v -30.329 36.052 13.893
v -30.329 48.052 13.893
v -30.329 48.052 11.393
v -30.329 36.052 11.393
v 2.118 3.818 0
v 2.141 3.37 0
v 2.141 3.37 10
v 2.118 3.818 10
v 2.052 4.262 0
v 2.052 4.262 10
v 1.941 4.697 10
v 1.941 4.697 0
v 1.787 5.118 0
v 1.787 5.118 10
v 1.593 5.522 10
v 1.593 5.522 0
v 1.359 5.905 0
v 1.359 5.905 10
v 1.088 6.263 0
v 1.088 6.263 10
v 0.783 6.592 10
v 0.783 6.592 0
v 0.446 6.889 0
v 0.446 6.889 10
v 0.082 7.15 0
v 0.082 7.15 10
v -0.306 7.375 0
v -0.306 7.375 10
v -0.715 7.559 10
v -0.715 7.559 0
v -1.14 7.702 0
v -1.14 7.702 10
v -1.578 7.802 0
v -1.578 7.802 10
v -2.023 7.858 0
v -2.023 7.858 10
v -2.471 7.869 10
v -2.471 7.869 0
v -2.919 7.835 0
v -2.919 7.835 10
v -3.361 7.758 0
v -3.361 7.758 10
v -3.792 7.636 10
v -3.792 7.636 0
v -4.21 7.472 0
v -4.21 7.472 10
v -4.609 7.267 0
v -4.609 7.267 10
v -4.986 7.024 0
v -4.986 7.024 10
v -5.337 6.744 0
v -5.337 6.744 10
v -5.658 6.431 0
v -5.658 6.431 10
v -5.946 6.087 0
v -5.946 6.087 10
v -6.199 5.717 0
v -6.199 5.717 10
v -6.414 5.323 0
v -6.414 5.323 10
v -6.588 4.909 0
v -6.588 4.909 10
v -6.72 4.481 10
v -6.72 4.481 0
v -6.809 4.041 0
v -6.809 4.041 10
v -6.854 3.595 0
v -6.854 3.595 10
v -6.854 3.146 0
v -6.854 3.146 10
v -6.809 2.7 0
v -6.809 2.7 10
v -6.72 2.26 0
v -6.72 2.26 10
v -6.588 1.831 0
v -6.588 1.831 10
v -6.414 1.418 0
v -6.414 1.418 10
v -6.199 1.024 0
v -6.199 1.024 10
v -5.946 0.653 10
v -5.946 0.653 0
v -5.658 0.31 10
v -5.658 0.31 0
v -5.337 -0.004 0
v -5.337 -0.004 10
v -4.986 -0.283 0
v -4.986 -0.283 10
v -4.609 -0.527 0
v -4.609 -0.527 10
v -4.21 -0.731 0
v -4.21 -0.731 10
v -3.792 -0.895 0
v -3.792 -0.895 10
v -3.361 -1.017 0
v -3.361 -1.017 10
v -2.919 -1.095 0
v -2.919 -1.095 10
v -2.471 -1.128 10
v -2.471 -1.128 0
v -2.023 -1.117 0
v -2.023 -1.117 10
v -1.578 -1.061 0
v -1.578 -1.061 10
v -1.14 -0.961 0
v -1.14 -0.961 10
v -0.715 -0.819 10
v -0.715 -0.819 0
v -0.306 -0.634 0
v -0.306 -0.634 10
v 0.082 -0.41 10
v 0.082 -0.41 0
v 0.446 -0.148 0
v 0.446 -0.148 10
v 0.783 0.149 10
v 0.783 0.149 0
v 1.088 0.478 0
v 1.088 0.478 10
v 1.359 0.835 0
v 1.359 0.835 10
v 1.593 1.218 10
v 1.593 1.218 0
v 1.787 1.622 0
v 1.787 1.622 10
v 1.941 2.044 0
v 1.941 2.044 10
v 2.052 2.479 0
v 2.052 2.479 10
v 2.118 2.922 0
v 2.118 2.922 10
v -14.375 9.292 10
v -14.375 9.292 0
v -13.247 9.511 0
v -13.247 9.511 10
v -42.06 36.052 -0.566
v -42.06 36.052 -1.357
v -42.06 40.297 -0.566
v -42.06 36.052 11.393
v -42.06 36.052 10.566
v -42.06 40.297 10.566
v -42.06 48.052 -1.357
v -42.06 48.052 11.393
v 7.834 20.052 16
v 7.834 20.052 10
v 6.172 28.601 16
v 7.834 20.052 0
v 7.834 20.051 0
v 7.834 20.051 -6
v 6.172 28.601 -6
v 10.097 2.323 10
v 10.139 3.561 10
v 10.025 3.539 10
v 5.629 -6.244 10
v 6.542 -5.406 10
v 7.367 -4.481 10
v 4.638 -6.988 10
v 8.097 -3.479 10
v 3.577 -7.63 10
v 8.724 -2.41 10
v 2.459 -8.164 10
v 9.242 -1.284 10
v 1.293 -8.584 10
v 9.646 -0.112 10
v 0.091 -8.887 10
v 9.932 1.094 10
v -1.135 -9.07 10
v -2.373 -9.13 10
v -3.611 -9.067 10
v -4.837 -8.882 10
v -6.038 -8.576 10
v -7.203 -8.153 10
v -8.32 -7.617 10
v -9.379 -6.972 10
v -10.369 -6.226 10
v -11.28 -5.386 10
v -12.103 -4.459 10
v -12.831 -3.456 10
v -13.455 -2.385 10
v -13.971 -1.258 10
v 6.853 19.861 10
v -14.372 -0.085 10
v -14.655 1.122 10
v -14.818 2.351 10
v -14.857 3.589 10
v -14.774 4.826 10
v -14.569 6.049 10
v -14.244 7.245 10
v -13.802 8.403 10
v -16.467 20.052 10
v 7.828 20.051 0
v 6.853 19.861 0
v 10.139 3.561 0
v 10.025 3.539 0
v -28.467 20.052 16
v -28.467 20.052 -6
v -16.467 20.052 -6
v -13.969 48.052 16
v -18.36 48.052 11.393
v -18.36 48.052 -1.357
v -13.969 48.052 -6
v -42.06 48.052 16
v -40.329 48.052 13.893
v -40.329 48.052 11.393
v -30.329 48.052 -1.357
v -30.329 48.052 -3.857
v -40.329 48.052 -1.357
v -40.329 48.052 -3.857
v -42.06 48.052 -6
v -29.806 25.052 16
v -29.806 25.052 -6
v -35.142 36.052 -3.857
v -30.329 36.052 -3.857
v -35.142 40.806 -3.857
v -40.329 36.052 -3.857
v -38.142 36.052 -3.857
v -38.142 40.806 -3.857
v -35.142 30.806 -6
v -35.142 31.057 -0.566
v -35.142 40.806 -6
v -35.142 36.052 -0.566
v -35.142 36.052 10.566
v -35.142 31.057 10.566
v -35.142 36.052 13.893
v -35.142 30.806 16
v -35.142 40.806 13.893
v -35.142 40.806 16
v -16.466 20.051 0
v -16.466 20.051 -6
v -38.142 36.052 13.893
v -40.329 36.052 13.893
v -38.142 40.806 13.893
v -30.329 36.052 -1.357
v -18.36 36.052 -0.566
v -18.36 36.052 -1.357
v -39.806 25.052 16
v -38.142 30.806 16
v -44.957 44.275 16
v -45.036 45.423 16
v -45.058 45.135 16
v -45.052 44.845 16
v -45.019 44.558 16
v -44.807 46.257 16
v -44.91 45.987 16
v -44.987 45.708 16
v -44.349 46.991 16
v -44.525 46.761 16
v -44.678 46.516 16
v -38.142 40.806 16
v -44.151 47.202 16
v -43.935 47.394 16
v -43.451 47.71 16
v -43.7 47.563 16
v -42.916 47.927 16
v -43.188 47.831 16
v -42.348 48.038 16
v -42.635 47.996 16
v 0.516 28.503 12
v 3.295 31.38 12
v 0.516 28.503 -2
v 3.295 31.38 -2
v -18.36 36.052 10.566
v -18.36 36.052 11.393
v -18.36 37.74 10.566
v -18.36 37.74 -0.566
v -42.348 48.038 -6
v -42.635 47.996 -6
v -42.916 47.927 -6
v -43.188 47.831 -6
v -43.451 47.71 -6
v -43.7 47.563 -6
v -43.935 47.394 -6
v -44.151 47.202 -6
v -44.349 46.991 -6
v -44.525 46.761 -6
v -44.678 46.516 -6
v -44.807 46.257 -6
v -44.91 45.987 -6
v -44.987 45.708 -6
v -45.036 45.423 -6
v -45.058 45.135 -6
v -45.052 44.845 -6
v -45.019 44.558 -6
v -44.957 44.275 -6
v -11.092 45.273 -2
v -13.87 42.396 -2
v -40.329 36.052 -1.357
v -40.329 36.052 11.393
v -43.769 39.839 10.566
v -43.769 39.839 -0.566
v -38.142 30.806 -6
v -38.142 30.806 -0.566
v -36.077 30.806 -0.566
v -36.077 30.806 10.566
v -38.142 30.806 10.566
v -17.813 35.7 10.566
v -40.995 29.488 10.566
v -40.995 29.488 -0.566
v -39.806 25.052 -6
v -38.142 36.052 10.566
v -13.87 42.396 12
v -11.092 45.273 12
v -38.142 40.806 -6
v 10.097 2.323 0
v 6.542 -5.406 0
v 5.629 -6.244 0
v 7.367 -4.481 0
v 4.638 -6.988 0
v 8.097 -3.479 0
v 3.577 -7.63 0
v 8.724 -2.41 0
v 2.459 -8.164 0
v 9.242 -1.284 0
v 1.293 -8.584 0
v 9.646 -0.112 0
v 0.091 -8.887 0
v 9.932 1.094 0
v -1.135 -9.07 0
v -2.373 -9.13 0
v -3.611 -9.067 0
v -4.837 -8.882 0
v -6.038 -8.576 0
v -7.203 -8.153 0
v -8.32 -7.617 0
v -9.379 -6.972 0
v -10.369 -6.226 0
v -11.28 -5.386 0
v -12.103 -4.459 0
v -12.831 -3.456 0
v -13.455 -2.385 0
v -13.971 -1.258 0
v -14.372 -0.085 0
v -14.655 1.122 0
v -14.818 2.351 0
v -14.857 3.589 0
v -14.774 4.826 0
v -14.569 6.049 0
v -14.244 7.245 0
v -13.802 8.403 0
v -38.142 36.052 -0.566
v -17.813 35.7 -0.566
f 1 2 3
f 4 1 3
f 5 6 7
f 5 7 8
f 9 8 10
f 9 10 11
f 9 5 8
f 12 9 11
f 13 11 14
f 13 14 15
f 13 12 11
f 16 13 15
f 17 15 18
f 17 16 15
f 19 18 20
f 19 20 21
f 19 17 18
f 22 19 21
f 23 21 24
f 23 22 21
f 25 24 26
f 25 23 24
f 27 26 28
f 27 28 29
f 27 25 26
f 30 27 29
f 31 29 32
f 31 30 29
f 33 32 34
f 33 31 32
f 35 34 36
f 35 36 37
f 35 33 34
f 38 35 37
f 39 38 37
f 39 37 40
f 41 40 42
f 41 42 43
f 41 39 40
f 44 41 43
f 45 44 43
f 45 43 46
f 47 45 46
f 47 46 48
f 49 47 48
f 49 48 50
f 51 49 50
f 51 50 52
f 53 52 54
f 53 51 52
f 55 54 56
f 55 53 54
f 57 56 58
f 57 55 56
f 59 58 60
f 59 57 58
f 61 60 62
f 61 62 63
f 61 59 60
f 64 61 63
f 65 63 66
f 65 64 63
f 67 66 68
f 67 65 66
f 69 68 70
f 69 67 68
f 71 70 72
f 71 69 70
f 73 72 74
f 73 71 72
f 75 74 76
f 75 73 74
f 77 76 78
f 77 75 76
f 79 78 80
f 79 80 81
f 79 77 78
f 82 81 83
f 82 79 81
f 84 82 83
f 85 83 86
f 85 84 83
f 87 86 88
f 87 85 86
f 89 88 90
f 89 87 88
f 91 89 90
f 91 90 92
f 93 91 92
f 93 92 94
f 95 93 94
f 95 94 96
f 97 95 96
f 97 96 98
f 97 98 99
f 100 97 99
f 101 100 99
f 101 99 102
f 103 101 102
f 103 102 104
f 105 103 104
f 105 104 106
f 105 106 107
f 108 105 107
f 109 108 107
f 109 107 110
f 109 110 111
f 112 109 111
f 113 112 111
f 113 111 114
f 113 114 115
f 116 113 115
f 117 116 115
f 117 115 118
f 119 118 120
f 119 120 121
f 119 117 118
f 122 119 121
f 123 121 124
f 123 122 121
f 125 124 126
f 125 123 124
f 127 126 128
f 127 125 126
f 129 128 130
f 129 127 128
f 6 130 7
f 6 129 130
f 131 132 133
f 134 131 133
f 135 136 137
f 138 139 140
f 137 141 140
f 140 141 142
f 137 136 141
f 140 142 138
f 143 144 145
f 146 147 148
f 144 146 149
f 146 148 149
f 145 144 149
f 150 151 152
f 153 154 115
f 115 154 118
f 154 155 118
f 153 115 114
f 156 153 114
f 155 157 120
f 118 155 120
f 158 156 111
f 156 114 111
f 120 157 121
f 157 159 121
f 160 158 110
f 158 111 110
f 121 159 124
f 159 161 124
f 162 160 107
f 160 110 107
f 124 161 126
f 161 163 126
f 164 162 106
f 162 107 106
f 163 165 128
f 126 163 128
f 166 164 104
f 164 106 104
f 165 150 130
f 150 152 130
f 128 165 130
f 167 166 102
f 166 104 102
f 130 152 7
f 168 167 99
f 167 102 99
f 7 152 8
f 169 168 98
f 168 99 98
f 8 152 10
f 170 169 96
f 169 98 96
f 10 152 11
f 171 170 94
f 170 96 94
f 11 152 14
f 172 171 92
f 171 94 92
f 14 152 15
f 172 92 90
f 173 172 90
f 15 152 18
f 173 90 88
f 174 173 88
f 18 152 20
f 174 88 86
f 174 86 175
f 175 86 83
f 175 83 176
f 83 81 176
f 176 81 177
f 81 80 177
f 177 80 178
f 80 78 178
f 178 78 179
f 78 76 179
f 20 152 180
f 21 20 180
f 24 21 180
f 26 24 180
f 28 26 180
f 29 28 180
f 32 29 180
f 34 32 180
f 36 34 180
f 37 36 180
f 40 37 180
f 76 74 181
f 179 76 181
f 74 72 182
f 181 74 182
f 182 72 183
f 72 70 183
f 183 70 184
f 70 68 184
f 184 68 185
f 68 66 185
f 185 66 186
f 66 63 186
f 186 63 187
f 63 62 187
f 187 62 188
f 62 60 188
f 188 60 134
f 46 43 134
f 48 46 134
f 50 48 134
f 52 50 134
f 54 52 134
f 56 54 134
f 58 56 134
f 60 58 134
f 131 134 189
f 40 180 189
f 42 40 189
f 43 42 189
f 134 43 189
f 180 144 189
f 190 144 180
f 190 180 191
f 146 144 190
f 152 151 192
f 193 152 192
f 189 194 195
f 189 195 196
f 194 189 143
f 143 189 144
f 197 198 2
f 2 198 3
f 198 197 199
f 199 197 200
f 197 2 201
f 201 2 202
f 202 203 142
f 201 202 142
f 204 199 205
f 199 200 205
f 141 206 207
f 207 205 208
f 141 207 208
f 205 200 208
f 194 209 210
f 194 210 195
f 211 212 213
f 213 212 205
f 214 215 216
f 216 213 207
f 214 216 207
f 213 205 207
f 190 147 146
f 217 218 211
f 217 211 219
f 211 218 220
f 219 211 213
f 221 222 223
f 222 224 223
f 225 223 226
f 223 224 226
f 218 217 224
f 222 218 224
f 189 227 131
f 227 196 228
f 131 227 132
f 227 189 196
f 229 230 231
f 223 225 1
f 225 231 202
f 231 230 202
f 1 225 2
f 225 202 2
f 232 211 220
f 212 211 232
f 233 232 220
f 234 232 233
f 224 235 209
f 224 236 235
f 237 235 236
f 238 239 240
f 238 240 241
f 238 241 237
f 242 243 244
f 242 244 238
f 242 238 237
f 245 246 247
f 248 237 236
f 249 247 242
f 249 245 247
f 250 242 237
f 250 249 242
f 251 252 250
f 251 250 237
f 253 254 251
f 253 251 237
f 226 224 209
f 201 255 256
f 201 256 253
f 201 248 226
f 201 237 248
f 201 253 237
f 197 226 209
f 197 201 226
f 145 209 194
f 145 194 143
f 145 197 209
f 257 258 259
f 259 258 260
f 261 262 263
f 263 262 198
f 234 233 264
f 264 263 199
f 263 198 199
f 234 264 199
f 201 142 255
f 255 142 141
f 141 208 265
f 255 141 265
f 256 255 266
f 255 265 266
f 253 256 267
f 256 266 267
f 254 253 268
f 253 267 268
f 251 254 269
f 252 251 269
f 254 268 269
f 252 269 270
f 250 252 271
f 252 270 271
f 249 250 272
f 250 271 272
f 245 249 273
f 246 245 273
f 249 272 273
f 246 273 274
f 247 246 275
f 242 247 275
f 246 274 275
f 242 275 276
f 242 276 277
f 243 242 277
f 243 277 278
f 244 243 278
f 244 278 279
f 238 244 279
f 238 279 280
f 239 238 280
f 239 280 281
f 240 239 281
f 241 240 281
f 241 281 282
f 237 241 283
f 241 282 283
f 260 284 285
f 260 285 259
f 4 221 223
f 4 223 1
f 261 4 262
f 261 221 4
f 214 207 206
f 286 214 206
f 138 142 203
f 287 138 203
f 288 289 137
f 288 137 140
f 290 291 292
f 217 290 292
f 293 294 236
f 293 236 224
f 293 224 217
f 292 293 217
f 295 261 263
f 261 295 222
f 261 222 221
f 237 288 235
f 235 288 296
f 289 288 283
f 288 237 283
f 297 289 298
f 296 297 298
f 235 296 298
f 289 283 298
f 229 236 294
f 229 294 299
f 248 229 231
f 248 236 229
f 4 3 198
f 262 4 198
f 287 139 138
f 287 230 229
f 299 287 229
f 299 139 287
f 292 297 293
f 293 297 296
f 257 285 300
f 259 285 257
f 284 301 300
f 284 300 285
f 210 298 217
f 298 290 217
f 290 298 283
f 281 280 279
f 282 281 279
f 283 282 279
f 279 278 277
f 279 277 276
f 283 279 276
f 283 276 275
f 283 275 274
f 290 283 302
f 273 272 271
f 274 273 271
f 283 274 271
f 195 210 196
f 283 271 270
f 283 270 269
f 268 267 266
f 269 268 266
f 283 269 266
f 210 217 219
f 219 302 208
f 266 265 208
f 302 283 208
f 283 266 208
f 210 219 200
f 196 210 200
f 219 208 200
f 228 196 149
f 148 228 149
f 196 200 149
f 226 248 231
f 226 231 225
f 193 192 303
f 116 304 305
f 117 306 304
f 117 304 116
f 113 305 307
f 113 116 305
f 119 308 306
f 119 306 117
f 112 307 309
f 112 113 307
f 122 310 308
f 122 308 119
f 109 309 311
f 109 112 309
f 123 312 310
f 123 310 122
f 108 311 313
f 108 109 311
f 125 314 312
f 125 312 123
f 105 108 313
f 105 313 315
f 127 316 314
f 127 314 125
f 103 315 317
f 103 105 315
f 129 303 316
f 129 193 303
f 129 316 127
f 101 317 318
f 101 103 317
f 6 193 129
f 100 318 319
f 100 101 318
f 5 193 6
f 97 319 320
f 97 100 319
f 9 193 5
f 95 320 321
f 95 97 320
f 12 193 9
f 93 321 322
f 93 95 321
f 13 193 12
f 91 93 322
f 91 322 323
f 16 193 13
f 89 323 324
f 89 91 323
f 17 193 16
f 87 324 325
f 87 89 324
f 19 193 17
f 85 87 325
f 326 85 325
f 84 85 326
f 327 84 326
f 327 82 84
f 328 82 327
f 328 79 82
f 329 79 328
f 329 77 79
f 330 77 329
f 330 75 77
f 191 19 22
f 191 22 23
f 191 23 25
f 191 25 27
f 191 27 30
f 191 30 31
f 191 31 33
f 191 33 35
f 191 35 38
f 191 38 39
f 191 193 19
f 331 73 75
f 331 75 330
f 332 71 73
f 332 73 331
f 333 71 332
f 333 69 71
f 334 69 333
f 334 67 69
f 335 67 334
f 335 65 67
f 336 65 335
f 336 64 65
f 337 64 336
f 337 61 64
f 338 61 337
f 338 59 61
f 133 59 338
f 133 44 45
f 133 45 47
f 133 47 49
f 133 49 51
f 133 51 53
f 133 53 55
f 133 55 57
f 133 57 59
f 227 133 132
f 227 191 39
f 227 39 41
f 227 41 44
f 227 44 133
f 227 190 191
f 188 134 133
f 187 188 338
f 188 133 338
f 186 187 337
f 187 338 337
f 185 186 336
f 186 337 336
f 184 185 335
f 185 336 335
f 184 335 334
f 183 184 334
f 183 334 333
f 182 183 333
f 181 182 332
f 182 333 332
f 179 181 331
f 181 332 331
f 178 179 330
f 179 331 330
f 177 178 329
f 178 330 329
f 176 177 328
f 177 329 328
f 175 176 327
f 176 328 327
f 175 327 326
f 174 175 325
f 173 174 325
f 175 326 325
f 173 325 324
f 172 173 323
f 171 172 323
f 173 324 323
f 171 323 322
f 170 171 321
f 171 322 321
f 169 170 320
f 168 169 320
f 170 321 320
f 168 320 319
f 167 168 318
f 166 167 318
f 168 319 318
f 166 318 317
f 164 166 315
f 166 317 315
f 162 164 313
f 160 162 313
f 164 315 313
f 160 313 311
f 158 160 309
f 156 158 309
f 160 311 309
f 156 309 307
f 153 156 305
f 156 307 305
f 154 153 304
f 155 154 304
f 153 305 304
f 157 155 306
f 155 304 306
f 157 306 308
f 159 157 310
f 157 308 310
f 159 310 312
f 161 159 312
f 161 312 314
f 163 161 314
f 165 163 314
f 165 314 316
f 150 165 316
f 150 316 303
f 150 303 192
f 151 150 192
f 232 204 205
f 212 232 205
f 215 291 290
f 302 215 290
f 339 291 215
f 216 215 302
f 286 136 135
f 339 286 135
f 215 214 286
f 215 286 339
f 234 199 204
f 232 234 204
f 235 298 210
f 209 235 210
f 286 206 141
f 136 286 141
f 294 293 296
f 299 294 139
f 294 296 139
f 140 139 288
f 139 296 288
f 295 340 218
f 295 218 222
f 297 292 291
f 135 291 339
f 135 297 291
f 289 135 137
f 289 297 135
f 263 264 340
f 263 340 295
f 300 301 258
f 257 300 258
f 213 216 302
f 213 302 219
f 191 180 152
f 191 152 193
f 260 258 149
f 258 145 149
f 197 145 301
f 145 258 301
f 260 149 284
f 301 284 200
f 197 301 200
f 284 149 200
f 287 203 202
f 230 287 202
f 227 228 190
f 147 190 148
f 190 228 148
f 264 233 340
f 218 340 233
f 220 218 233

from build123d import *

# Parameters (mm, degrees)
SKETCH1_R                = 12.499992756
SKETCH1_R_2              = 4.5
BOSS_EXTRUDE1_DEPTH      = 10
BOSS_EXTRUDE2_DEPTH      = 11
BOSS_EXTRUDE2_DEPTH_BACK = 11
SKETCH7_W                = 11.132946344
SKETCH7_H                = 10.716090789
CUT_EXTRUDE1_DEPTH       = 24
CUT_EXTRUDE2_DEPTH       = 12
SKETCH9_W                = 20
SKETCH9_H                = 14
CUT_EXTRUDE3_DEPTH       = 4
SKETCH11_W               = 3
SKETCH11_H               = 10
CUT_EXTRUDE6_DEPTH       = 29
CUT_EXTRUDE7_DEPTH       = 6
CUT_EXTRUDE8_DEPTH       = 6
SKETCH14_W               = 10
SKETCH14_H               = 16.627390186
CUT_EXTRUDE11_DEPTH      = 1


with BuildPart() as part:
    # Sketch1 → Boss-Extrude1 (new body)
    with BuildSketch(Plane.XY):
        with Locations((-2.359227986, 3.370325694)):
            Circle(SKETCH1_R)
        with Locations((-2.359227986, 3.370325694)):
            Circle(SKETCH1_R_2, mode=Mode.SUBTRACT)
    extrude(amount=BOSS_EXTRUDE1_DEPTH)

    # Sketch2 → Boss-Extrude2 (add, two sides: drawn at the far end of the back side and taken through both)
    with BuildSketch(Plane.XY.offset(5).offset(-BOSS_EXTRUDE2_DEPTH_BACK)):
        with BuildLine():
            Line((-16.466638632, 20.051877412), (-14.375085898, 9.29175702))
            Line((-14.375085898, 9.29175702), (-13.02590258, 9.55401134))
            ThreePointArc((-13.02590258, 9.55401134), (-0.090713324, 14.688621829), (10.07529252, 5.184113893))
            Line((10.07529252, 5.184113893), (10.656286173, 5.533200654))
            Line((10.656286173, 5.533200654), (6.172277384, 28.601437959))
            Line((6.172277384, 28.601437959), (-13.969202109, 48.051877412))
            Line((-13.969202109, 48.051877412), (-42.05953414, 48.051877412))
            ThreePointArc((-42.05953414, 48.051877412), (-44.439585044, 46.878168187), (-44.957305605, 44.275438644))
            Line((-44.957305605, 44.275438644), (-39.806421347, 25.051869783))
            Line((-39.806421347, 25.051869783), (-29.806421347, 25.051869783))
            Line((-29.806421347, 25.051869783), (-28.466638632, 20.051877412))
            Line((-28.466638632, 20.051877412), (-16.466638632, 20.051877412))
        make_face()
    extrude(amount=BOSS_EXTRUDE2_DEPTH + BOSS_EXTRUDE2_DEPTH_BACK)

    # Sketch7 → Cut-Extrude1 (cut)
    with BuildSketch(Plane(origin=(-30.87704133, -8.273389154, 0), x_dir=(0, 0, 1), z_dir=(-0.9659265233912161, -0.2588164434678725, 0))):
        with Locations((5, 44.451666175)):
            Rectangle(SKETCH7_W, SKETCH7_H)
    extrude(amount=-CUT_EXTRUDE1_DEPTH, mode=Mode.SUBTRACT)

    # Sketch8 → Cut-Extrude2 (cut)
    with BuildSketch(Plane(origin=(0, 48.051877412, 0), x_dir=(1, 0, 0), z_dir=(0, 1, 0))):
        Polygon((-42.05953414, 1.356763346), (-42.05953414, -11.393238561), (-40.329492636, -11.393238561), (-40.329492636, -13.893238561), (-30.329492636, -13.893238561), (-30.329492636, -11.393238561), (-18.359521933, -11.393238561), (-18.359521933, 1.356763346), (-30.329492636, 1.356763346), (-30.329492636, 3.856761439), (-40.329492636, 3.856761439), (-40.329492636, 1.356763346), align=None)
    extrude(amount=-CUT_EXTRUDE2_DEPTH, mode=Mode.SUBTRACT)

    # Sketch9 → Cut-Extrude3 (cut)
    with BuildSketch(Plane(origin=(17.270448516, 17.884037296, 0), x_dir=(0.7193391079113861, -0.6946590874877052, 0), z_dir=(0.6946590874877052, 0.7193391079113861, 0))):
        with Locations((-29.428277492, -5)):
            Rectangle(SKETCH9_W, SKETCH9_H)
    extrude(amount=-CUT_EXTRUDE3_DEPTH, mode=Mode.SUBTRACT)

    # Sketch11 → Cut-Extrude6 (cut)
    with BuildSketch(Plane.XY.offset(16)):
        with Locations((-36.641862234, 35.805951308)):
            Rectangle(SKETCH11_W, SKETCH11_H)
    extrude(amount=-CUT_EXTRUDE6_DEPTH, mode=Mode.SUBTRACT)

    # Sketch12 → Cut-Extrude7 (cut)
    with BuildSketch(Plane(origin=(0, 0, -6), x_dir=(-1, 0, 0), z_dir=(0, 0, -1))):
        with BuildLine():
            Line((-11.615804928, 5.778217556), (-10.049600589, 4.877240525))
            ThreePointArc((-10.049600589, 4.877240525), (0.290903423, 13.095654553), (13.015538376, 9.552771876))
            Line((13.015538376, 9.552771876), (14.90302776, 9.185881295))
            Line((14.90302776, 9.185881295), (17.014921429, 20.050637947))
            Line((17.014921429, 20.050637947), (-8.841528869, 20.050637947))
            Line((-8.841528869, 20.050637947), (-11.615804928, 5.778217556))
        make_face()
    extrude(amount=-CUT_EXTRUDE7_DEPTH, mode=Mode.SUBTRACT)

    # Sketch13 → Cut-Extrude8 (cut)
    with BuildSketch(Plane.XY.offset(16)):
        with BuildLine():
            Line((-13.02590258, 9.55401134), (-14.375085898, 9.29175702))
            Line((-14.375085898, 9.29175702), (-16.466638632, 20.051877412))
            Line((-16.466638632, 20.051877412), (7.83414275, 20.051877412))
            Line((7.83414275, 20.051877412), (10.656286173, 5.533200654))
            Line((10.656286173, 5.533200654), (10.07529252, 5.184113893))
            ThreePointArc((10.07529252, 5.184113893), (-0.363045865, 13.248952536), (-13.02590258, 9.55401134))
        make_face()
    extrude(amount=-CUT_EXTRUDE8_DEPTH, mode=Mode.SUBTRACT)

    # Sketch14 → Cut-Extrude11 (cut)
    with BuildSketch(Plane(origin=(11.304697945, 2.197409549, 0), x_dir=(0, 0, -1), z_dir=(0.9816272018550709, 0.1908089006786217, 0))):
        with Locations((-5, 9.874949057)):
            Rectangle(SKETCH14_W, SKETCH14_H)
    extrude(amount=-CUT_EXTRUDE11_DEPTH, mode=Mode.SUBTRACT)


solid = part.part
